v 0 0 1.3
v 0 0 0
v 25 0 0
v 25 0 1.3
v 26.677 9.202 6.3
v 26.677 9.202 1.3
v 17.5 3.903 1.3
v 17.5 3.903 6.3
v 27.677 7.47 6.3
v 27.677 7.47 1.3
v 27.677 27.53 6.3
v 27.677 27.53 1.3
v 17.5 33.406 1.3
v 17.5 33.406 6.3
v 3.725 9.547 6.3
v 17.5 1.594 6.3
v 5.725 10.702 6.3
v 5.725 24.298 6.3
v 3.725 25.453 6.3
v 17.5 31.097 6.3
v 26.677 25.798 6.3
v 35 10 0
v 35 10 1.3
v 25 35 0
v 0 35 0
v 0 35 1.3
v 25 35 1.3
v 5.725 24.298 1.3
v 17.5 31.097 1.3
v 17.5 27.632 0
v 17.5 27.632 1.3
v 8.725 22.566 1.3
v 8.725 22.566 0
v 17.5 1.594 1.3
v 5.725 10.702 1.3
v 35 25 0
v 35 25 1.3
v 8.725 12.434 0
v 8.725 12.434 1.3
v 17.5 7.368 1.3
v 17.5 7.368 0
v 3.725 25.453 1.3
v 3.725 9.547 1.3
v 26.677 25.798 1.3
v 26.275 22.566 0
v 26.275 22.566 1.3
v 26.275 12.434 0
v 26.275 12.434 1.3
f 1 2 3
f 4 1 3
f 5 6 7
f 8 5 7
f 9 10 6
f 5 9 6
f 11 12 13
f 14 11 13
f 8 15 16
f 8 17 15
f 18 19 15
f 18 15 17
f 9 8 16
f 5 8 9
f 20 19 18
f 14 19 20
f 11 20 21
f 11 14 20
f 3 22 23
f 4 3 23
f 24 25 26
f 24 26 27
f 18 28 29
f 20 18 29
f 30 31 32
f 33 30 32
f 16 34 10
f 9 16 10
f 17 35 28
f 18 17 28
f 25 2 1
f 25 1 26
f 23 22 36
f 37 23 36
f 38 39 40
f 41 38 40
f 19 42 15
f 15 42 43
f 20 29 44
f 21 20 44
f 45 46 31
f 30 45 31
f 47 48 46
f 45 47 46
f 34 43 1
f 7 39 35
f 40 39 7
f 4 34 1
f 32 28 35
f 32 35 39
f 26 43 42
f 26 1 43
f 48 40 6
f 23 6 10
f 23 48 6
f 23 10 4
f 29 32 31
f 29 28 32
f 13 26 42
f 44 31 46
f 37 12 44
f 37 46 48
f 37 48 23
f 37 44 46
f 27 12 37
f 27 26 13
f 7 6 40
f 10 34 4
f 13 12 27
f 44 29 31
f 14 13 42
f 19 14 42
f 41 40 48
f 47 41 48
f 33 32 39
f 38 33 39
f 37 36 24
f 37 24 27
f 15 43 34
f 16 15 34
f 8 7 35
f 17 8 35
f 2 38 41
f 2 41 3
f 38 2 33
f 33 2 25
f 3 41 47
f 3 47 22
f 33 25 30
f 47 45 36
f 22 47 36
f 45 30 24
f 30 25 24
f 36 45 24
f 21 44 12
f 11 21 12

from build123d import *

# Parameters (mm, degrees)
F0_W     = 35
F0_H     = 35
F1_DEPTH = 1.3
F3_DEPTH = 25
F4_DEPTH = 5
F5_SIZE  = 10


with BuildPart() as f1:
    # F0 (on Top) → F1 (new body)
    with BuildSketch(Plane.XY):
        with Locations((17.5, 17.5)):
            Rectangle(F0_W, F0_H)
    extrude(amount=F1_DEPTH)

    # F2 (on face) → F3 (cut)
    with BuildSketch(Plane.XY.offset(1.3)):
        Polygon((26.275, 22.566249), (17.5, 27.632497), (8.725, 22.566249), (8.725, 12.433751), (17.5, 7.367503), (26.275, 12.433751), align=None)
    extrude(amount=-F3_DEPTH, mode=Mode.SUBTRACT)

    # F2 (on face) → F4 (join)
    with BuildSketch(Plane.XY.offset(1.3)):
        Polygon((5.725, 10.701701), (5.725, 24.298299), (17.5, 31.096599), (26.676924, 25.798299), (27.676924, 27.53035), (17.5, 33.406), (3.725, 25.453), (3.725, 9.547), (17.5, 1.594), (27.676924, 7.46965), (26.676924, 9.201701), (17.5, 3.903401), align=None)
    extrude(amount=F4_DEPTH)

    # F5
    f5_edges = [f1.edges().sort_by_distance(p)[0] for p in [
        (35, 0, 0.65),
        (35, 35, 0.65),
    ]]
    chamfer(f5_edges, length=F5_SIZE)


solid = f1.part
